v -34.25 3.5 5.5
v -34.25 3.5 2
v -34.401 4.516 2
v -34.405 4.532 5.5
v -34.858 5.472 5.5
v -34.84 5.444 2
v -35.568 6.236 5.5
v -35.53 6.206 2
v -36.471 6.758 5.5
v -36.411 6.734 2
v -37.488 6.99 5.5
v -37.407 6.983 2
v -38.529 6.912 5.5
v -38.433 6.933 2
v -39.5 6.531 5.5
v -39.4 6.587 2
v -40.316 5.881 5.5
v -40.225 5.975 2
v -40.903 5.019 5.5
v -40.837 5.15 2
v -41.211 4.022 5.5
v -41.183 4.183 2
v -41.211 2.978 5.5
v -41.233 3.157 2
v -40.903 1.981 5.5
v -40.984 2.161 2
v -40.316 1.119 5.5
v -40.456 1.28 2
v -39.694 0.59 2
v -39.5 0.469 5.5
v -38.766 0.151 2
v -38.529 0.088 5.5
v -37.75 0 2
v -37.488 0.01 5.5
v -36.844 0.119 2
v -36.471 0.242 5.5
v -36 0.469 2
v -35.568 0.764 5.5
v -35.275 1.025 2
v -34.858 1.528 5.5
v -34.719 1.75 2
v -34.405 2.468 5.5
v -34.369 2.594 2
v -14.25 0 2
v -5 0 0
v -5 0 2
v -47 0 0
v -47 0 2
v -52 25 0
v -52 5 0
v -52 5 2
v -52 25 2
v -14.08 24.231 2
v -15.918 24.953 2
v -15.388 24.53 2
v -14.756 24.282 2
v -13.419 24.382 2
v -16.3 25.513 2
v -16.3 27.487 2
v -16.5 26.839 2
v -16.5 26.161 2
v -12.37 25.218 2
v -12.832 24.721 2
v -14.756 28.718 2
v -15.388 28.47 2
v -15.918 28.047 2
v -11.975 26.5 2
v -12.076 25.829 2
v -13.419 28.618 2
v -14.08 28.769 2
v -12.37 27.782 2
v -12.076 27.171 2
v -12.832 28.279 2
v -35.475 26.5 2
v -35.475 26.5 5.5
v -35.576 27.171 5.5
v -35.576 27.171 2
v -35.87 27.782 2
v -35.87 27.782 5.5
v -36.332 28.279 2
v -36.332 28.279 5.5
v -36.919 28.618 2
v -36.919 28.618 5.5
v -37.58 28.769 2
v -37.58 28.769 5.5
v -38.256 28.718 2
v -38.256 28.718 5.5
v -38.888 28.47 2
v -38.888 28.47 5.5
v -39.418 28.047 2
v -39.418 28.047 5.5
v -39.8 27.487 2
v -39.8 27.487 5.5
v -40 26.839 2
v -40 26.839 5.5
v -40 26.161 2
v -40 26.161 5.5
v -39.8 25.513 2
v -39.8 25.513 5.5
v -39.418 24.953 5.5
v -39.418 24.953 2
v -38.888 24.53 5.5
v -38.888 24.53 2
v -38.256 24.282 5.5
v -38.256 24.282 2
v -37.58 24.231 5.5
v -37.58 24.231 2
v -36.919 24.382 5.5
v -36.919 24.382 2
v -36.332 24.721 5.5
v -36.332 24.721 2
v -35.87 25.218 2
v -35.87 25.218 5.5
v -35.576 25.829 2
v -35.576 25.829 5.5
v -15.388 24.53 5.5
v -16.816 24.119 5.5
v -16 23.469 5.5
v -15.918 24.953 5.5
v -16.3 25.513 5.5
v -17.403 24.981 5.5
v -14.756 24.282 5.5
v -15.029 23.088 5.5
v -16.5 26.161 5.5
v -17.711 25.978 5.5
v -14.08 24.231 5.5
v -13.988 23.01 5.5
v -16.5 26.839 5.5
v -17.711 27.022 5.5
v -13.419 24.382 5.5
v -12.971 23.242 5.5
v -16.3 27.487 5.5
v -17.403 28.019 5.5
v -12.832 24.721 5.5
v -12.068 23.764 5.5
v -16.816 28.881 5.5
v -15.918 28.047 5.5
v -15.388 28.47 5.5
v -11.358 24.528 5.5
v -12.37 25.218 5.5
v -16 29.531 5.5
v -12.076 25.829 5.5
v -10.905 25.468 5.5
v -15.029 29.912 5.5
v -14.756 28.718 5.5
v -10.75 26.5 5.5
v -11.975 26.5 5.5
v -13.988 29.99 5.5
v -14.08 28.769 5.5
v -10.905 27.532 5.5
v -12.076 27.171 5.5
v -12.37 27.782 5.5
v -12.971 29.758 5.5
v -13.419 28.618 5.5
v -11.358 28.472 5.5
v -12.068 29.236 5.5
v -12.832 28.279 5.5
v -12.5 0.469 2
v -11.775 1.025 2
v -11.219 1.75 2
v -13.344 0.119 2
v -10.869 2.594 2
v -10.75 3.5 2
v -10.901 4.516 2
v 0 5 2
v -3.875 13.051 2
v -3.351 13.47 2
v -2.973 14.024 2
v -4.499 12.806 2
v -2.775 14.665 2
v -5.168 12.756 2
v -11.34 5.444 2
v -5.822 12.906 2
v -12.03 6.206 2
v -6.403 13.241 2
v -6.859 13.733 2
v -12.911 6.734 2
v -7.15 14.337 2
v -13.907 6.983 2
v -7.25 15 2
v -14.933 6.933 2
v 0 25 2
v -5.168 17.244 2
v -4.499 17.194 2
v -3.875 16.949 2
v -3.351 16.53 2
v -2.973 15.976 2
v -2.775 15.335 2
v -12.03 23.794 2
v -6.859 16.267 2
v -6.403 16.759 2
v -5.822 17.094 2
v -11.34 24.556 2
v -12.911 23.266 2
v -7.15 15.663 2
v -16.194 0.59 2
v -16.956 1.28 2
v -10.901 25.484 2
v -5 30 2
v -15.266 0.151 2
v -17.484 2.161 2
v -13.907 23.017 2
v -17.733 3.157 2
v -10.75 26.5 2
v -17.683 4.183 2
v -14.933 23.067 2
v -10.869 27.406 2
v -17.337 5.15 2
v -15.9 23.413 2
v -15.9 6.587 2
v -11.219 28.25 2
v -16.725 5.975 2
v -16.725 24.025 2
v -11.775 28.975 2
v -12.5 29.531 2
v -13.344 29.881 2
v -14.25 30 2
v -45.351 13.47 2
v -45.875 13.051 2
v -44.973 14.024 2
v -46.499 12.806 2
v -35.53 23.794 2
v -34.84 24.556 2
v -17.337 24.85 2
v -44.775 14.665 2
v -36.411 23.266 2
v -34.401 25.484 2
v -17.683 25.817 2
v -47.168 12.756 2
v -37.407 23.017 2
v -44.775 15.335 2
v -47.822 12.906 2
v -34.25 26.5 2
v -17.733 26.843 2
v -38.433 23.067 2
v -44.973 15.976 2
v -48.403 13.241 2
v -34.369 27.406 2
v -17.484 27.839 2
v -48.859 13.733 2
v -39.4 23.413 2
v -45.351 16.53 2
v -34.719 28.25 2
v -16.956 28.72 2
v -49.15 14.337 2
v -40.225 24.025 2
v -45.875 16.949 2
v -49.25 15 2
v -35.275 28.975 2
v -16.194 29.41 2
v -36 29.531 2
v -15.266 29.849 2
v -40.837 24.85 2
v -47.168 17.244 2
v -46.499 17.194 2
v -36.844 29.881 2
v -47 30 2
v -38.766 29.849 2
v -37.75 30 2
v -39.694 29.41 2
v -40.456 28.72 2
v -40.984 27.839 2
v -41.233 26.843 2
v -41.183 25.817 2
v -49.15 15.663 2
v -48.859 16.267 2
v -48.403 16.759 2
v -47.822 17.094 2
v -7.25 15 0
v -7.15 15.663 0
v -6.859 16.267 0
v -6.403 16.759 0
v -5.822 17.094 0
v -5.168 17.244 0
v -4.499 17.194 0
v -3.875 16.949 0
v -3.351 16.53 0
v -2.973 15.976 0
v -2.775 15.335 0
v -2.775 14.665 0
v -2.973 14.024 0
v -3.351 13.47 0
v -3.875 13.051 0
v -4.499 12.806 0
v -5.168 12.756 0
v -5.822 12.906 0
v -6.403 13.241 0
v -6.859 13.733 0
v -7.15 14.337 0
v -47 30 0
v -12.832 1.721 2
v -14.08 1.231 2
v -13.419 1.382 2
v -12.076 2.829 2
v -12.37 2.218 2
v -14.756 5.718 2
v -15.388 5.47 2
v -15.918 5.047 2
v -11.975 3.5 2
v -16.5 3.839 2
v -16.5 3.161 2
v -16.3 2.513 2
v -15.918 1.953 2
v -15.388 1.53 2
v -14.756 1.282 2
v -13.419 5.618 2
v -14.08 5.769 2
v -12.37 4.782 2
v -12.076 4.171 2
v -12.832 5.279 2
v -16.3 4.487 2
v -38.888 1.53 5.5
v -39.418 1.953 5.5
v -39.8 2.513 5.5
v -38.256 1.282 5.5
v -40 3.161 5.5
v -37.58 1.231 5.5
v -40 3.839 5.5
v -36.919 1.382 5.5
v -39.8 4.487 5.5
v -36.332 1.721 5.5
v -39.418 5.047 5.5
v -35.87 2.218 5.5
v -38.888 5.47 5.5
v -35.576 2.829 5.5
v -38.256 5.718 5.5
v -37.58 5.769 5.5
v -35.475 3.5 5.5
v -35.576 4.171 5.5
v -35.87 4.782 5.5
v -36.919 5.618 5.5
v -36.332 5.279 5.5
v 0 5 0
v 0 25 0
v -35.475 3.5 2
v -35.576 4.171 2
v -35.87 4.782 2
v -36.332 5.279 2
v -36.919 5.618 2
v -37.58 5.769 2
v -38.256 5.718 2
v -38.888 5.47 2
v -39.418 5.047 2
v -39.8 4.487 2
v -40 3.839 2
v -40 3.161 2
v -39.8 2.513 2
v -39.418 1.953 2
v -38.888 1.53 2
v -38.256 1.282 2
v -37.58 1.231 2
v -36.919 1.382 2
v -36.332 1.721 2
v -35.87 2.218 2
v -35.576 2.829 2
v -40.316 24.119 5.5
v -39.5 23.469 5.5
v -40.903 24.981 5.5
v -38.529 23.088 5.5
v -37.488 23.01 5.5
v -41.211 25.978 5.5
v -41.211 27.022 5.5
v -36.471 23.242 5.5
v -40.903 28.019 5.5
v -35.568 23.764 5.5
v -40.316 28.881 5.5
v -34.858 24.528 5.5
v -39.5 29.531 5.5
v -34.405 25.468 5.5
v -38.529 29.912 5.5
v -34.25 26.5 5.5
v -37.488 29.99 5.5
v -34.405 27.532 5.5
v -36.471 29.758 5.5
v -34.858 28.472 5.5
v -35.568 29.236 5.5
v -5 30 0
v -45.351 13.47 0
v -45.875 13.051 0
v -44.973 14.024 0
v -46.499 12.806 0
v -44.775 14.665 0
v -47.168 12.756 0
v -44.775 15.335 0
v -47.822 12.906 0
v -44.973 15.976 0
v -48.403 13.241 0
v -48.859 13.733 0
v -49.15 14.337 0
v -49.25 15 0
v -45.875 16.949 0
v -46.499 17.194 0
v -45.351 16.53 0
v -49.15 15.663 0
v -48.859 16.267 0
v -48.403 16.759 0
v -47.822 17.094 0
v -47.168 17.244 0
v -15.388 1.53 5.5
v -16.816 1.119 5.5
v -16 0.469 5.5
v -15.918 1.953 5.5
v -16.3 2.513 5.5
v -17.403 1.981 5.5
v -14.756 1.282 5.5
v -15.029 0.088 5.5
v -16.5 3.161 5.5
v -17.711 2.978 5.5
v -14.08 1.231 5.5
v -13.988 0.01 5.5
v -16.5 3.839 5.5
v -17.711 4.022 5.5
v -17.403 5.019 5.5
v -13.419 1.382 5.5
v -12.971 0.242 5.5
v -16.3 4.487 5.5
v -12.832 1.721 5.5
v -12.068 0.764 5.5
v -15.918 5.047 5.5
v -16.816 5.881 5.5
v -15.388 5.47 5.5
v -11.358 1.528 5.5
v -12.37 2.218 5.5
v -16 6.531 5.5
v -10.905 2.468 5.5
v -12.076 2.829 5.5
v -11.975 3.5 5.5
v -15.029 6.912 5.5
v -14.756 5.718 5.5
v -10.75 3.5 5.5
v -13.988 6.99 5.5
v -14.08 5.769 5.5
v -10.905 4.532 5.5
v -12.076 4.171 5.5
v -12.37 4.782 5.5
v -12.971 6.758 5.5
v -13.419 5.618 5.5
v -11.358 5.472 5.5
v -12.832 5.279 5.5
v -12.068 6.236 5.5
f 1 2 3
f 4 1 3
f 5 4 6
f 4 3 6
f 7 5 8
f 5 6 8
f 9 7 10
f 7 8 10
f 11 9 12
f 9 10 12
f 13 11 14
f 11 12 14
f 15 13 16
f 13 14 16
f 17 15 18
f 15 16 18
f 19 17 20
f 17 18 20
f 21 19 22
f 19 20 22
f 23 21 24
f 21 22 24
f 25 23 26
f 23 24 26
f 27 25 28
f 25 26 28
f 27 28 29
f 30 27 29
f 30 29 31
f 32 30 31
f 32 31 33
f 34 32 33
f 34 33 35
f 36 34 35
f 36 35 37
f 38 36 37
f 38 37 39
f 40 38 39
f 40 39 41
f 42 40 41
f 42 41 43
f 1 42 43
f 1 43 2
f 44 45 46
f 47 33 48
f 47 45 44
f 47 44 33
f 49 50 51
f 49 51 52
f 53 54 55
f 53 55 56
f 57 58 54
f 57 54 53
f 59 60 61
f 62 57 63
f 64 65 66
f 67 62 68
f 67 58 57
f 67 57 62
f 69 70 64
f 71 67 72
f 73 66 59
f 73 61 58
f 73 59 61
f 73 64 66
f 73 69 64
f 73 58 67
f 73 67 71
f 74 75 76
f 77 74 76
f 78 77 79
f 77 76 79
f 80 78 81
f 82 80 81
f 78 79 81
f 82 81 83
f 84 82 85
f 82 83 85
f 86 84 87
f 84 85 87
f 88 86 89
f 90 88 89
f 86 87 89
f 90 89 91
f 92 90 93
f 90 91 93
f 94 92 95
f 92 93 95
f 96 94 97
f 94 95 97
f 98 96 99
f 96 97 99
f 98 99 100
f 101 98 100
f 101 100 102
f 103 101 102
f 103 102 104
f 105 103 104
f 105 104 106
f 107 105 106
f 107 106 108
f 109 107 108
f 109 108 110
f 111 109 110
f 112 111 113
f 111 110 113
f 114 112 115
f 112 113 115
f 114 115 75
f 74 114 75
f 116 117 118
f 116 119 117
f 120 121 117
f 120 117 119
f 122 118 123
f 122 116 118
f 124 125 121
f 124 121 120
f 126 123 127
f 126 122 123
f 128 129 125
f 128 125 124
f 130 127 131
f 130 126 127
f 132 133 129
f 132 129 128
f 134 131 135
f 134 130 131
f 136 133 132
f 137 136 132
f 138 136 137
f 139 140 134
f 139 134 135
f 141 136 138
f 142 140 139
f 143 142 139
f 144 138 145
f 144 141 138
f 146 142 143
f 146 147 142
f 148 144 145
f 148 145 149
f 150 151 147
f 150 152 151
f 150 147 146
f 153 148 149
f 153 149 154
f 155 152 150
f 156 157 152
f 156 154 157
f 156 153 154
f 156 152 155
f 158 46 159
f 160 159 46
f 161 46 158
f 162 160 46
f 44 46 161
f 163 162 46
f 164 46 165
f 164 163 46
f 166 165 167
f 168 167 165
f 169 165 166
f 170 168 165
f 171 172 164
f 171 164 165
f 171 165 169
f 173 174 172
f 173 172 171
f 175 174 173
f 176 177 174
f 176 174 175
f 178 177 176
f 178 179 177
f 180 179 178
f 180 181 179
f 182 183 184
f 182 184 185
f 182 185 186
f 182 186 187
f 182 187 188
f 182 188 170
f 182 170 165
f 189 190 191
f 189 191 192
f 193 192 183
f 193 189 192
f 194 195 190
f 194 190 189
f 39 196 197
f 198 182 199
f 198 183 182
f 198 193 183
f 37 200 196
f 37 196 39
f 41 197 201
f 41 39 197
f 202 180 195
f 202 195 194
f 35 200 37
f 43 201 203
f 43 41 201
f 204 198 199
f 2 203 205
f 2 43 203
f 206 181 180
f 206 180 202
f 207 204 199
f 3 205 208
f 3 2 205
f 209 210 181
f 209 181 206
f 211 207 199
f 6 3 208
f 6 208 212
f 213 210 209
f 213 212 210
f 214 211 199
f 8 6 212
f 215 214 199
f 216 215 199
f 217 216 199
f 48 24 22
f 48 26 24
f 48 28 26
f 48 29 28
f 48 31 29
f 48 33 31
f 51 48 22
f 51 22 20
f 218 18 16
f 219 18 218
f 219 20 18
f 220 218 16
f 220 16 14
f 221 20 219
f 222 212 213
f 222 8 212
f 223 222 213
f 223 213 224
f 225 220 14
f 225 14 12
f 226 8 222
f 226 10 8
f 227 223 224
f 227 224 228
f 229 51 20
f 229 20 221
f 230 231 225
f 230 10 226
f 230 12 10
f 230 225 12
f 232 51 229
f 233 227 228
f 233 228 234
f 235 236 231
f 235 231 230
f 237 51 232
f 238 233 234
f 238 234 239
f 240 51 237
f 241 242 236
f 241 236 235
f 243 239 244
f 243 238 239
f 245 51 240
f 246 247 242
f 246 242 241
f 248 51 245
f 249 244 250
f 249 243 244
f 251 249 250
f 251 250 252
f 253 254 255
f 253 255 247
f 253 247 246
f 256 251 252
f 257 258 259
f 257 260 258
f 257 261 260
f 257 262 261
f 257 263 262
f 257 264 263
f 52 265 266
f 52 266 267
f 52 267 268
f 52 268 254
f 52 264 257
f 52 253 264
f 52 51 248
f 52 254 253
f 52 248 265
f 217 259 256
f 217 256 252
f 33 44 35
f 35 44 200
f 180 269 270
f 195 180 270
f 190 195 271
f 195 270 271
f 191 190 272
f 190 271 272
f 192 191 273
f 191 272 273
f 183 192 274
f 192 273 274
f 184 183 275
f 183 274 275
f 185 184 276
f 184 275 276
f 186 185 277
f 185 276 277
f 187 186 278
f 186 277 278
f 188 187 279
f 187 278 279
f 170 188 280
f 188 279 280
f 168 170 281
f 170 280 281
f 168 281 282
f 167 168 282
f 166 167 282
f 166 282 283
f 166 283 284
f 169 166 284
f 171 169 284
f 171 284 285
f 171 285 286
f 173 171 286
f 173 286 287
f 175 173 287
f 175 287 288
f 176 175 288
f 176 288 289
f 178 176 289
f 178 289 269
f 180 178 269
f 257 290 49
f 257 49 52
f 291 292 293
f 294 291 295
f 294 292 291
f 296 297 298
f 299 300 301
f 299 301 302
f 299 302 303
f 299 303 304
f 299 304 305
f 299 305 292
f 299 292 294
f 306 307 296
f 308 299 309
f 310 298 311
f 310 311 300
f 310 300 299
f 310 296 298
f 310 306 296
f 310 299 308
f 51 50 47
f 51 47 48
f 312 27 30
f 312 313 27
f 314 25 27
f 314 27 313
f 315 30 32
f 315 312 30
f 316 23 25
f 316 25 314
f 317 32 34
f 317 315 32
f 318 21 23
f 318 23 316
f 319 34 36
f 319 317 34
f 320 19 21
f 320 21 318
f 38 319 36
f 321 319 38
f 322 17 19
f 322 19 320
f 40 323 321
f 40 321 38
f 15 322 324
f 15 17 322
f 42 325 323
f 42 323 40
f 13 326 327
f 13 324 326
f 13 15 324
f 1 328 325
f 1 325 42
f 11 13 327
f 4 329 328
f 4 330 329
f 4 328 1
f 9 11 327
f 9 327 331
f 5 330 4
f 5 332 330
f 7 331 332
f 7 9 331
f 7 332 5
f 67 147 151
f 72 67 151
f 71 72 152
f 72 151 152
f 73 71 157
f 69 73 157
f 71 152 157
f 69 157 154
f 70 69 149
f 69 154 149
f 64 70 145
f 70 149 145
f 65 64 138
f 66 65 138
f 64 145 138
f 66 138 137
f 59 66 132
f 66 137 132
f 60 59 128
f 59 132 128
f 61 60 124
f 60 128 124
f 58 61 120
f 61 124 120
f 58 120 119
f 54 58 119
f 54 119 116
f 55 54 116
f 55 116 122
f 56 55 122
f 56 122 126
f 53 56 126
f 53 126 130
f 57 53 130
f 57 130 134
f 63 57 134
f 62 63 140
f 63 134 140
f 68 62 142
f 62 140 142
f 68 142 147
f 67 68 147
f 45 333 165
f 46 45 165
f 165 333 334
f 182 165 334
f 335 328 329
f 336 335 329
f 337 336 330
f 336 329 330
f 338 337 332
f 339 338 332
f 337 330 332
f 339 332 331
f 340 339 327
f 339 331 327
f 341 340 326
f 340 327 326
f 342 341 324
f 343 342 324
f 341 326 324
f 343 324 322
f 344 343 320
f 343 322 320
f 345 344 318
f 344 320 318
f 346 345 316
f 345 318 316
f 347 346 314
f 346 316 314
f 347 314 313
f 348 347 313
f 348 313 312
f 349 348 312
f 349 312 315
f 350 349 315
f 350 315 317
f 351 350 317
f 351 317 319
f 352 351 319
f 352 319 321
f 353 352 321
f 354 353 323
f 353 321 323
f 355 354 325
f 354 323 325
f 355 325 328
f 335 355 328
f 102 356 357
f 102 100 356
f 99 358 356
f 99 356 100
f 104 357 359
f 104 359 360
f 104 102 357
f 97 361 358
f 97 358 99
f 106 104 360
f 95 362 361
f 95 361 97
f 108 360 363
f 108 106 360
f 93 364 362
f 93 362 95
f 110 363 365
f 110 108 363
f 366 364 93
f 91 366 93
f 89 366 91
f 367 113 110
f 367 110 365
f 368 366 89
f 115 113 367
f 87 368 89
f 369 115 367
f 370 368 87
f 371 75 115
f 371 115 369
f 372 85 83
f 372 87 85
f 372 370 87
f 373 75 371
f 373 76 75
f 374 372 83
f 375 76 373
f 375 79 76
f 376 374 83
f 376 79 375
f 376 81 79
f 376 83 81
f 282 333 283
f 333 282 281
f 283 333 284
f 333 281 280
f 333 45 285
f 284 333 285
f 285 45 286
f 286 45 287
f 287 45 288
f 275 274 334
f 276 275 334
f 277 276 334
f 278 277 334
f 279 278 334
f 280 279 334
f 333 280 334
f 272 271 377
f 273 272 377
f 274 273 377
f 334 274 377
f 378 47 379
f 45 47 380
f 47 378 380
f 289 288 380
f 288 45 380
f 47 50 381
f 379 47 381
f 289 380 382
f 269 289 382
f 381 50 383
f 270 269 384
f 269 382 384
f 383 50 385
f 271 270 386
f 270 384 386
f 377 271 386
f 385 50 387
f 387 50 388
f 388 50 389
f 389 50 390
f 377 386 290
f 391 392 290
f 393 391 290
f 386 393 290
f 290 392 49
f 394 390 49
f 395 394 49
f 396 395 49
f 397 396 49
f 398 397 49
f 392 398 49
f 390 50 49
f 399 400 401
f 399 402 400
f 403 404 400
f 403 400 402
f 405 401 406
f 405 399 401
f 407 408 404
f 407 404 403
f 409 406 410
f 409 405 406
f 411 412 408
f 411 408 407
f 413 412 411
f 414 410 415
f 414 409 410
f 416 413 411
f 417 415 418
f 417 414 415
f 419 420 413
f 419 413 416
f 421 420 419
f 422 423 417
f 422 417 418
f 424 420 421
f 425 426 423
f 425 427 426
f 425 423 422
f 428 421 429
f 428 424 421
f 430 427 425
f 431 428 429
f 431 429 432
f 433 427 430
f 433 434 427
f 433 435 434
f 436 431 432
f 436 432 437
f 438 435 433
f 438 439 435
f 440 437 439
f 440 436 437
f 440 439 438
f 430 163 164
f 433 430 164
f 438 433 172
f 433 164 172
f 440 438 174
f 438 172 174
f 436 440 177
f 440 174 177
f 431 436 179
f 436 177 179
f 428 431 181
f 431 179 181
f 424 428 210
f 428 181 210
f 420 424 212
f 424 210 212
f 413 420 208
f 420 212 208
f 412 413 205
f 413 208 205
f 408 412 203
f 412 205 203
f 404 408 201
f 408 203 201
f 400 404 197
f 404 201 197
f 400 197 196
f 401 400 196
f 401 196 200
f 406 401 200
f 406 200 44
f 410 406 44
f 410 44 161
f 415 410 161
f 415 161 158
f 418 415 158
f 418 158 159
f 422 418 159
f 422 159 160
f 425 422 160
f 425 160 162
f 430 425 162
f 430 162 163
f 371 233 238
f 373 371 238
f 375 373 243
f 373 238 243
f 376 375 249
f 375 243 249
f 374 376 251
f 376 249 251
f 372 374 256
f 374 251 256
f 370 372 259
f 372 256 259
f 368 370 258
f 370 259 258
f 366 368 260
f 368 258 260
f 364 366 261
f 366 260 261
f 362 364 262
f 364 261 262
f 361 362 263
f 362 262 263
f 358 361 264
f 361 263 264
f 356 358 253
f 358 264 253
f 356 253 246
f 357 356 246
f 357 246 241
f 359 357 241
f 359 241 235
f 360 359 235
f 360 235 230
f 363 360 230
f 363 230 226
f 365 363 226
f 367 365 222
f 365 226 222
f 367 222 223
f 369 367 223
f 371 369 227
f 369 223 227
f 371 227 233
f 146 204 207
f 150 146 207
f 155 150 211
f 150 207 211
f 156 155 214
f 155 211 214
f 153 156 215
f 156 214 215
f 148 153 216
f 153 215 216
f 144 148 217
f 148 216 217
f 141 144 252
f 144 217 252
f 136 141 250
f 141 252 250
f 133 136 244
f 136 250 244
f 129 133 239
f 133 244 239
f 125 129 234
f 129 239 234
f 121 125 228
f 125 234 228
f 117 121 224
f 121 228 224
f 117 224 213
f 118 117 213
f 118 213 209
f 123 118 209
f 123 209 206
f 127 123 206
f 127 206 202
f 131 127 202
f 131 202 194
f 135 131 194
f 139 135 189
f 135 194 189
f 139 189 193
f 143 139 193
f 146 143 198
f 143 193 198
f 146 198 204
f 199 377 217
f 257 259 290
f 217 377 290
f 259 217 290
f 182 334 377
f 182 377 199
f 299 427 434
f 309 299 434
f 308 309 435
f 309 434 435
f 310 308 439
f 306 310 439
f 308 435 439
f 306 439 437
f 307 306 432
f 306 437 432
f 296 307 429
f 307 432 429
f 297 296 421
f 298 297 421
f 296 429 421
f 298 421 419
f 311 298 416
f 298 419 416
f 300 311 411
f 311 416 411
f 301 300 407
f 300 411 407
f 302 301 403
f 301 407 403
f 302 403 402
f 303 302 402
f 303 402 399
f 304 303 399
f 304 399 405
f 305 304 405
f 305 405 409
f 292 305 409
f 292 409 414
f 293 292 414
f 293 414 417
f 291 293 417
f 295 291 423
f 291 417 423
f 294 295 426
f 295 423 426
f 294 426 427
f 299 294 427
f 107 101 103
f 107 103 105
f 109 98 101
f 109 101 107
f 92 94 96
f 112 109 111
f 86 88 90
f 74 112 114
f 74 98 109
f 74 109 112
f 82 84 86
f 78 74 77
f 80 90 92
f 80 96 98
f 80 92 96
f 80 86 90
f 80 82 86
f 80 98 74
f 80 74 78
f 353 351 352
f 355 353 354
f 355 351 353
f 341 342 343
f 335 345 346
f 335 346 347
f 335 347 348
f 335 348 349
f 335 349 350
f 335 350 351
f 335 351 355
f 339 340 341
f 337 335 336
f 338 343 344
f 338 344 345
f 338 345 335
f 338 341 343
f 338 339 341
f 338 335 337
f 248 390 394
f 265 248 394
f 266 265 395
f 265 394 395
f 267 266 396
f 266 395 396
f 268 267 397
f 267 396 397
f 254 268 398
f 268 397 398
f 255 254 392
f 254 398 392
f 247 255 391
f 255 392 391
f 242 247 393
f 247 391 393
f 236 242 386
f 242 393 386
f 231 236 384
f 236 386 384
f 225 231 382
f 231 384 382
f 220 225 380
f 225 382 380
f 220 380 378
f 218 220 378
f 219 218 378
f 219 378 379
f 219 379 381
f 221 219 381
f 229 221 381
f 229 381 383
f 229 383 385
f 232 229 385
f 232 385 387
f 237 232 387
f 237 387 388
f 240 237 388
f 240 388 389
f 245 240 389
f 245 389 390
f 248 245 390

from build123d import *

# Parameters (mm, degrees)
SKETCH_1_W          = 30
SKETCH_1_H          = 52
EXTRUDE_1_DEPTH     = 2
SKETCH_2_R          = 3.5
EXTRUDE_2_DEPTH     = 3.5
SKETCH_5_R          = 2.275
CUT_EXTRUDE_1_DEPTH = 3.5
HOLE_WIZARD_M4_1_D  = 4.5
CHAMFER_1_SIZE      = 5


with BuildPart() as part:
    # ｽｹｯﾁ1 → ﾎﾞｽ - 押し出し1 (new body)
    with BuildSketch(Plane(origin=(0, 0, 0), x_dir=(0, 1, 0), z_dir=(0, 0, 1))):
        with Locations((15, 26)):
            Rectangle(SKETCH_1_W, SKETCH_1_H)
    extrude(amount=EXTRUDE_1_DEPTH)

    # ｽｹｯﾁ2 → ﾎﾞｽ - 押し出し2 (add)
    with BuildSketch(Plane.XY.offset(2)):
        with Locations((-37.75, 26.5)):
            Circle(SKETCH_2_R)
        with Locations((-14.25, 26.5)):
            Circle(SKETCH_2_R)
        with Locations((-14.25, 3.5)):
            Circle(SKETCH_2_R)
        with Locations((-37.75, 3.5)):
            Circle(SKETCH_2_R)
    extrude(amount=EXTRUDE_2_DEPTH)

    # ｽｹｯﾁ5 → ｶｯﾄ - 押し出し1 (cut)
    with BuildSketch(Plane.XY.offset(5.5)):
        with Locations((-37.75, 26.5)):
            Circle(SKETCH_5_R)
        with Locations((-14.25, 26.5)):
            Circle(SKETCH_5_R)
        with Locations((-14.25, 3.5)):
            Circle(SKETCH_5_R)
        with Locations((-37.75, 3.5)):
            Circle(SKETCH_5_R)
    extrude(amount=-CUT_EXTRUDE_1_DEPTH, mode=Mode.SUBTRACT)

    # M4 すきま穴1 (through all)
    with Locations(Plane.XY.offset(2)):
        with Locations((-47, 15), (-5, 15)):
            Hole(HOLE_WIZARD_M4_1_D / 2)

    # 面取り1
    chamfer_1_edges = [part.edges().sort_by_distance(p)[0] for p in [
        (-52, 0, 1),
        (-52, 30, 1),
        (0, 30, 1),
        (0, 0, 1),
    ]]
    chamfer(chamfer_1_edges, length=CHAMFER_1_SIZE)


solid = part.part
